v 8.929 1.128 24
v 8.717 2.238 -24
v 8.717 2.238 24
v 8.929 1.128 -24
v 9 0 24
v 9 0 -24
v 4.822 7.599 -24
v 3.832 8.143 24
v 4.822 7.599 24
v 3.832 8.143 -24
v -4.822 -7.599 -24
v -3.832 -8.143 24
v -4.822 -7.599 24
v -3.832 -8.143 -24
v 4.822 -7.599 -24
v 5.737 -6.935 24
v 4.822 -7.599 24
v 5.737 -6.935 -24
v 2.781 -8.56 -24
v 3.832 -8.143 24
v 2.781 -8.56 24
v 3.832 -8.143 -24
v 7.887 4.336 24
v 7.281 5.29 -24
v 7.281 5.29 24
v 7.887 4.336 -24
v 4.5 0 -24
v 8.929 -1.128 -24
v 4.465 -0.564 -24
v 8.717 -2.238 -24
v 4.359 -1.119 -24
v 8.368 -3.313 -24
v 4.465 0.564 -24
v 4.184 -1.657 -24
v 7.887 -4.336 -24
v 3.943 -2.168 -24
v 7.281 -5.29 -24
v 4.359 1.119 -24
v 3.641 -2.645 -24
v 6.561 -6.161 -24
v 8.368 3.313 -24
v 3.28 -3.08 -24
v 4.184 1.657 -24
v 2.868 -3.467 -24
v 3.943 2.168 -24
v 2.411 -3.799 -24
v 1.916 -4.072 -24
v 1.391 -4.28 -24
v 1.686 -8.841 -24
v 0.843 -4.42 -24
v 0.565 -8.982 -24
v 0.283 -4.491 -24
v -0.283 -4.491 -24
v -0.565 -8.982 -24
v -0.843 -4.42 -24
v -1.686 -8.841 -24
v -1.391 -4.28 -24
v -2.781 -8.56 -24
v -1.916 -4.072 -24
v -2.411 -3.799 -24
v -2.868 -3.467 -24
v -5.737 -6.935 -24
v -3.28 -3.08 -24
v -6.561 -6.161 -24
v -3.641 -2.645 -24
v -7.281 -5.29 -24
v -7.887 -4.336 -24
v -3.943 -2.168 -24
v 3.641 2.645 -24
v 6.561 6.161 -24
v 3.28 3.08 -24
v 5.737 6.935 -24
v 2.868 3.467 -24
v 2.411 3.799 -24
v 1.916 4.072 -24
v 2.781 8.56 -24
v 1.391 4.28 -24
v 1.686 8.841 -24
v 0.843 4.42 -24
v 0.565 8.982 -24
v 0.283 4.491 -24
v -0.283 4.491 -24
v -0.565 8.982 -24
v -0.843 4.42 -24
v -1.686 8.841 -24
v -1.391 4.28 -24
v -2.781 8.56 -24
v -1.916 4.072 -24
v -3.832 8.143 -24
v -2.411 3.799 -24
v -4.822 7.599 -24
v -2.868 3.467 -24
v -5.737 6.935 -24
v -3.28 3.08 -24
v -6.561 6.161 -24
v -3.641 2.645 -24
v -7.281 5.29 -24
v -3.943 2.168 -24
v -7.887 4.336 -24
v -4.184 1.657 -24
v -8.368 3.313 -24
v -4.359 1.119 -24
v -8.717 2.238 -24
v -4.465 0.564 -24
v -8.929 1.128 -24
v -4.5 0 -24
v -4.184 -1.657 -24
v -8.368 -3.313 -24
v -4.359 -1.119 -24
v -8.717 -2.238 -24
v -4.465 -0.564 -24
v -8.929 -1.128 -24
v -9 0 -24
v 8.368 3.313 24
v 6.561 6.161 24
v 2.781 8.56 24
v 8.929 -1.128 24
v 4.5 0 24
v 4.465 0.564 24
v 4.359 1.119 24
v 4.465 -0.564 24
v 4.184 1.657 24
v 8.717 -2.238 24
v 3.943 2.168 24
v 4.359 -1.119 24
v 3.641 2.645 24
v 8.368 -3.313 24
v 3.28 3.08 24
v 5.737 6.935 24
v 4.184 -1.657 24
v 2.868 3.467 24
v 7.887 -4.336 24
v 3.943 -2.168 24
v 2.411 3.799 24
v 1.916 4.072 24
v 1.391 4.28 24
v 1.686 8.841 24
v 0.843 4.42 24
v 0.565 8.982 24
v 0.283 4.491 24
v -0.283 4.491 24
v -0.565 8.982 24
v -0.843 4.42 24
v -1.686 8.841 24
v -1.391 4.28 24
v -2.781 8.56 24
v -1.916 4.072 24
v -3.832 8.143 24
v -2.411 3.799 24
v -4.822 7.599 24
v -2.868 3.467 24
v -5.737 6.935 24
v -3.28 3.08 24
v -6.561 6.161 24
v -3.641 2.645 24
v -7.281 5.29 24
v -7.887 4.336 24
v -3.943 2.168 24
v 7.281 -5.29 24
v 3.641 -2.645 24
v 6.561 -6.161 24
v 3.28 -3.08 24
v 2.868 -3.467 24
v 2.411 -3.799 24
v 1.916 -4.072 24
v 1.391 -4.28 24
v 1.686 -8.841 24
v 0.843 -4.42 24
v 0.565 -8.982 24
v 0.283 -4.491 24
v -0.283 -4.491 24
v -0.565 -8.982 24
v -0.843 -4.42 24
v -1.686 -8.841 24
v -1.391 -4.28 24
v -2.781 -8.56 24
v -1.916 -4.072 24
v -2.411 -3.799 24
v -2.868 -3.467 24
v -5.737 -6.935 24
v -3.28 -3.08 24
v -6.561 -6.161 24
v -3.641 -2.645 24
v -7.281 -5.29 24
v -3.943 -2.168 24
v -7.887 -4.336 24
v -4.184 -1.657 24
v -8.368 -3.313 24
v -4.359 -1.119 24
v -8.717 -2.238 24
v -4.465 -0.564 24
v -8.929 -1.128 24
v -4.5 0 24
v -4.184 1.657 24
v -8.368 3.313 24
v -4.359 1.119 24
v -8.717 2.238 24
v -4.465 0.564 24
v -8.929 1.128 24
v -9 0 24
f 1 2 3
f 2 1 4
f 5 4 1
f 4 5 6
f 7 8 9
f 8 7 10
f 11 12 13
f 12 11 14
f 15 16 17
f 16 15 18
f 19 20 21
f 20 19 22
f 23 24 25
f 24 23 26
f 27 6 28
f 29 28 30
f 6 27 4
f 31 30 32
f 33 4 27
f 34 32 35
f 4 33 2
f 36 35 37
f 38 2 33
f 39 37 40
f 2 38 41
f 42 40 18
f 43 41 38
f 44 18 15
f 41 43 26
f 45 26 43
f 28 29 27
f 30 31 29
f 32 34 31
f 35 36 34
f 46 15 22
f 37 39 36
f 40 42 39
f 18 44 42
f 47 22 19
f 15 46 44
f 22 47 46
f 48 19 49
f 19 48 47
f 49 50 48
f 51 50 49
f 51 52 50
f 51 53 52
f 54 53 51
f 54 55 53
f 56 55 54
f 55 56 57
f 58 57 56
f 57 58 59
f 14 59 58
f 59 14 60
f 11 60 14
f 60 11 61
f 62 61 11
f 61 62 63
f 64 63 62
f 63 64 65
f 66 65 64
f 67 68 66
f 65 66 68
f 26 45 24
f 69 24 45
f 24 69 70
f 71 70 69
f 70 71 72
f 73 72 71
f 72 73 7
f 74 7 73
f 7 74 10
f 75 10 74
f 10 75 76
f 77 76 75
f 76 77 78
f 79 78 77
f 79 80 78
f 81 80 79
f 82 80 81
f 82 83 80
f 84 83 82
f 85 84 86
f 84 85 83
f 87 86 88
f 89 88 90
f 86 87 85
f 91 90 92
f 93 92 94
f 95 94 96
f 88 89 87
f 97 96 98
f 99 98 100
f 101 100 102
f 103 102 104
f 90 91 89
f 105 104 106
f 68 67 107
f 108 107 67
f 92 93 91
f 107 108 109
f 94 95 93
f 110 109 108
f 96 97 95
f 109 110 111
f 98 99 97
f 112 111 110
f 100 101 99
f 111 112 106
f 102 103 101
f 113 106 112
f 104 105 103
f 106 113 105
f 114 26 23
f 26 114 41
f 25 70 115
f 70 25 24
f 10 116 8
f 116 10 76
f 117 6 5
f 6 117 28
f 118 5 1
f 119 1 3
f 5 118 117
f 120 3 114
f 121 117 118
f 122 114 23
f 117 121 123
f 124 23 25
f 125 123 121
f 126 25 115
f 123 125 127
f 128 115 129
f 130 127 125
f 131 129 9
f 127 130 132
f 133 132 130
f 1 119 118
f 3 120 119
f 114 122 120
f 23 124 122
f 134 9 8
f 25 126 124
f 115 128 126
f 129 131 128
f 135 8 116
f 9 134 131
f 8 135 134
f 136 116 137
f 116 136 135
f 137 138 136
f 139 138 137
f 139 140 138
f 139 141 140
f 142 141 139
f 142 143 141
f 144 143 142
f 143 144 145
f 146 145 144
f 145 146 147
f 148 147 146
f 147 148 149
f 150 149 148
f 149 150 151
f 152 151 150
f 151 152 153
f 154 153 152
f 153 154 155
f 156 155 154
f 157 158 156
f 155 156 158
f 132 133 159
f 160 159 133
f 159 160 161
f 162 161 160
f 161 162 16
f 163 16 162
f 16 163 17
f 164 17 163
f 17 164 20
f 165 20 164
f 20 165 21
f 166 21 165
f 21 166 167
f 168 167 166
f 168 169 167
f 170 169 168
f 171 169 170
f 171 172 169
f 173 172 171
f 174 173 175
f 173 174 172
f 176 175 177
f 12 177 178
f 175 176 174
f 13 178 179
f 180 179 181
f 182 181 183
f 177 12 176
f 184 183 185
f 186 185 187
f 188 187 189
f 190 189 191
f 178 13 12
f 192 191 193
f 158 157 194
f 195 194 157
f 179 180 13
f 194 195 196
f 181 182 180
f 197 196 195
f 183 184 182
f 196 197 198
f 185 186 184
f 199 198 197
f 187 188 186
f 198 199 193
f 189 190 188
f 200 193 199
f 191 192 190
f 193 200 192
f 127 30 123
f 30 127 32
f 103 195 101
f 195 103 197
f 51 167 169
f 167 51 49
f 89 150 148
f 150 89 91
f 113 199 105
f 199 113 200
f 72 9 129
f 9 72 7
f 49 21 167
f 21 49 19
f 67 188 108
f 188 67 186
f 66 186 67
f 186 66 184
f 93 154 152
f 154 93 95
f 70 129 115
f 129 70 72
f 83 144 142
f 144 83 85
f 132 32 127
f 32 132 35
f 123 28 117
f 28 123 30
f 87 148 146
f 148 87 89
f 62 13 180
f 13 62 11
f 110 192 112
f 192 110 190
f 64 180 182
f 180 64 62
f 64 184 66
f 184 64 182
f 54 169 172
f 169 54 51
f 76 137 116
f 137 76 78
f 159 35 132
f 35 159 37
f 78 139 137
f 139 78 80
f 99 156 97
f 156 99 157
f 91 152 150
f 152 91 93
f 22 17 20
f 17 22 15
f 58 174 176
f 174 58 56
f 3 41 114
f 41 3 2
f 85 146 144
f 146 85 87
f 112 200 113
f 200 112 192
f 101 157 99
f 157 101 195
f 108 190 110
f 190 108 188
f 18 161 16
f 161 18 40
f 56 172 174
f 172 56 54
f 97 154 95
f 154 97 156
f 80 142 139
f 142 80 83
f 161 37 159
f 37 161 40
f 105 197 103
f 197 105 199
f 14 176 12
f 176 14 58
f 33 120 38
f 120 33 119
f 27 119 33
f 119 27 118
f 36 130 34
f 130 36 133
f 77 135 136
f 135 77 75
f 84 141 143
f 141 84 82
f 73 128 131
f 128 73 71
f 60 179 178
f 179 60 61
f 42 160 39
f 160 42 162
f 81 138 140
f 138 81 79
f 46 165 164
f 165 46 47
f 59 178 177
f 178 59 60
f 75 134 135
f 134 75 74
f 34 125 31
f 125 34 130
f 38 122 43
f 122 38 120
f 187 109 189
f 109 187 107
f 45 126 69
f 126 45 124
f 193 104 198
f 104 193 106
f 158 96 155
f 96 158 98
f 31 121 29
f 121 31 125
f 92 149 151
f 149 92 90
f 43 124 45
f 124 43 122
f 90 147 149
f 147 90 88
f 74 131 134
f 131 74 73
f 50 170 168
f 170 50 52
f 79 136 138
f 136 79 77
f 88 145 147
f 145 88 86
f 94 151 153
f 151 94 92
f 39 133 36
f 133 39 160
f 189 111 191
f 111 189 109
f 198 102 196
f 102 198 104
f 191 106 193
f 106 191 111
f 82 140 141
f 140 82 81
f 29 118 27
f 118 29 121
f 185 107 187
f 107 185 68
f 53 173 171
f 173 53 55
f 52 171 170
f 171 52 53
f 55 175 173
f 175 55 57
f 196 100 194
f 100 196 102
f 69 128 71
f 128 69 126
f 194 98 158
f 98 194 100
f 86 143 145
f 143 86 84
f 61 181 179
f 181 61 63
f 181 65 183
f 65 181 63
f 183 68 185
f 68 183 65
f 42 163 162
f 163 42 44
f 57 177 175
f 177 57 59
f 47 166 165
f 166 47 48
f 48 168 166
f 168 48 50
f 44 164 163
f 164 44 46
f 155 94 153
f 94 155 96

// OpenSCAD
$fn = 50;


difference() {
	union() {
		translate(v = [0, 0, -24.0000000000]) {
			cylinder(h = 48, r = 9.0000000000);
		}
	}
	union() {
		translate(v = [0, 0, -100.0000000000]) {
			cylinder(h = 200, r = 4.5000000000);
		}
	}
}
